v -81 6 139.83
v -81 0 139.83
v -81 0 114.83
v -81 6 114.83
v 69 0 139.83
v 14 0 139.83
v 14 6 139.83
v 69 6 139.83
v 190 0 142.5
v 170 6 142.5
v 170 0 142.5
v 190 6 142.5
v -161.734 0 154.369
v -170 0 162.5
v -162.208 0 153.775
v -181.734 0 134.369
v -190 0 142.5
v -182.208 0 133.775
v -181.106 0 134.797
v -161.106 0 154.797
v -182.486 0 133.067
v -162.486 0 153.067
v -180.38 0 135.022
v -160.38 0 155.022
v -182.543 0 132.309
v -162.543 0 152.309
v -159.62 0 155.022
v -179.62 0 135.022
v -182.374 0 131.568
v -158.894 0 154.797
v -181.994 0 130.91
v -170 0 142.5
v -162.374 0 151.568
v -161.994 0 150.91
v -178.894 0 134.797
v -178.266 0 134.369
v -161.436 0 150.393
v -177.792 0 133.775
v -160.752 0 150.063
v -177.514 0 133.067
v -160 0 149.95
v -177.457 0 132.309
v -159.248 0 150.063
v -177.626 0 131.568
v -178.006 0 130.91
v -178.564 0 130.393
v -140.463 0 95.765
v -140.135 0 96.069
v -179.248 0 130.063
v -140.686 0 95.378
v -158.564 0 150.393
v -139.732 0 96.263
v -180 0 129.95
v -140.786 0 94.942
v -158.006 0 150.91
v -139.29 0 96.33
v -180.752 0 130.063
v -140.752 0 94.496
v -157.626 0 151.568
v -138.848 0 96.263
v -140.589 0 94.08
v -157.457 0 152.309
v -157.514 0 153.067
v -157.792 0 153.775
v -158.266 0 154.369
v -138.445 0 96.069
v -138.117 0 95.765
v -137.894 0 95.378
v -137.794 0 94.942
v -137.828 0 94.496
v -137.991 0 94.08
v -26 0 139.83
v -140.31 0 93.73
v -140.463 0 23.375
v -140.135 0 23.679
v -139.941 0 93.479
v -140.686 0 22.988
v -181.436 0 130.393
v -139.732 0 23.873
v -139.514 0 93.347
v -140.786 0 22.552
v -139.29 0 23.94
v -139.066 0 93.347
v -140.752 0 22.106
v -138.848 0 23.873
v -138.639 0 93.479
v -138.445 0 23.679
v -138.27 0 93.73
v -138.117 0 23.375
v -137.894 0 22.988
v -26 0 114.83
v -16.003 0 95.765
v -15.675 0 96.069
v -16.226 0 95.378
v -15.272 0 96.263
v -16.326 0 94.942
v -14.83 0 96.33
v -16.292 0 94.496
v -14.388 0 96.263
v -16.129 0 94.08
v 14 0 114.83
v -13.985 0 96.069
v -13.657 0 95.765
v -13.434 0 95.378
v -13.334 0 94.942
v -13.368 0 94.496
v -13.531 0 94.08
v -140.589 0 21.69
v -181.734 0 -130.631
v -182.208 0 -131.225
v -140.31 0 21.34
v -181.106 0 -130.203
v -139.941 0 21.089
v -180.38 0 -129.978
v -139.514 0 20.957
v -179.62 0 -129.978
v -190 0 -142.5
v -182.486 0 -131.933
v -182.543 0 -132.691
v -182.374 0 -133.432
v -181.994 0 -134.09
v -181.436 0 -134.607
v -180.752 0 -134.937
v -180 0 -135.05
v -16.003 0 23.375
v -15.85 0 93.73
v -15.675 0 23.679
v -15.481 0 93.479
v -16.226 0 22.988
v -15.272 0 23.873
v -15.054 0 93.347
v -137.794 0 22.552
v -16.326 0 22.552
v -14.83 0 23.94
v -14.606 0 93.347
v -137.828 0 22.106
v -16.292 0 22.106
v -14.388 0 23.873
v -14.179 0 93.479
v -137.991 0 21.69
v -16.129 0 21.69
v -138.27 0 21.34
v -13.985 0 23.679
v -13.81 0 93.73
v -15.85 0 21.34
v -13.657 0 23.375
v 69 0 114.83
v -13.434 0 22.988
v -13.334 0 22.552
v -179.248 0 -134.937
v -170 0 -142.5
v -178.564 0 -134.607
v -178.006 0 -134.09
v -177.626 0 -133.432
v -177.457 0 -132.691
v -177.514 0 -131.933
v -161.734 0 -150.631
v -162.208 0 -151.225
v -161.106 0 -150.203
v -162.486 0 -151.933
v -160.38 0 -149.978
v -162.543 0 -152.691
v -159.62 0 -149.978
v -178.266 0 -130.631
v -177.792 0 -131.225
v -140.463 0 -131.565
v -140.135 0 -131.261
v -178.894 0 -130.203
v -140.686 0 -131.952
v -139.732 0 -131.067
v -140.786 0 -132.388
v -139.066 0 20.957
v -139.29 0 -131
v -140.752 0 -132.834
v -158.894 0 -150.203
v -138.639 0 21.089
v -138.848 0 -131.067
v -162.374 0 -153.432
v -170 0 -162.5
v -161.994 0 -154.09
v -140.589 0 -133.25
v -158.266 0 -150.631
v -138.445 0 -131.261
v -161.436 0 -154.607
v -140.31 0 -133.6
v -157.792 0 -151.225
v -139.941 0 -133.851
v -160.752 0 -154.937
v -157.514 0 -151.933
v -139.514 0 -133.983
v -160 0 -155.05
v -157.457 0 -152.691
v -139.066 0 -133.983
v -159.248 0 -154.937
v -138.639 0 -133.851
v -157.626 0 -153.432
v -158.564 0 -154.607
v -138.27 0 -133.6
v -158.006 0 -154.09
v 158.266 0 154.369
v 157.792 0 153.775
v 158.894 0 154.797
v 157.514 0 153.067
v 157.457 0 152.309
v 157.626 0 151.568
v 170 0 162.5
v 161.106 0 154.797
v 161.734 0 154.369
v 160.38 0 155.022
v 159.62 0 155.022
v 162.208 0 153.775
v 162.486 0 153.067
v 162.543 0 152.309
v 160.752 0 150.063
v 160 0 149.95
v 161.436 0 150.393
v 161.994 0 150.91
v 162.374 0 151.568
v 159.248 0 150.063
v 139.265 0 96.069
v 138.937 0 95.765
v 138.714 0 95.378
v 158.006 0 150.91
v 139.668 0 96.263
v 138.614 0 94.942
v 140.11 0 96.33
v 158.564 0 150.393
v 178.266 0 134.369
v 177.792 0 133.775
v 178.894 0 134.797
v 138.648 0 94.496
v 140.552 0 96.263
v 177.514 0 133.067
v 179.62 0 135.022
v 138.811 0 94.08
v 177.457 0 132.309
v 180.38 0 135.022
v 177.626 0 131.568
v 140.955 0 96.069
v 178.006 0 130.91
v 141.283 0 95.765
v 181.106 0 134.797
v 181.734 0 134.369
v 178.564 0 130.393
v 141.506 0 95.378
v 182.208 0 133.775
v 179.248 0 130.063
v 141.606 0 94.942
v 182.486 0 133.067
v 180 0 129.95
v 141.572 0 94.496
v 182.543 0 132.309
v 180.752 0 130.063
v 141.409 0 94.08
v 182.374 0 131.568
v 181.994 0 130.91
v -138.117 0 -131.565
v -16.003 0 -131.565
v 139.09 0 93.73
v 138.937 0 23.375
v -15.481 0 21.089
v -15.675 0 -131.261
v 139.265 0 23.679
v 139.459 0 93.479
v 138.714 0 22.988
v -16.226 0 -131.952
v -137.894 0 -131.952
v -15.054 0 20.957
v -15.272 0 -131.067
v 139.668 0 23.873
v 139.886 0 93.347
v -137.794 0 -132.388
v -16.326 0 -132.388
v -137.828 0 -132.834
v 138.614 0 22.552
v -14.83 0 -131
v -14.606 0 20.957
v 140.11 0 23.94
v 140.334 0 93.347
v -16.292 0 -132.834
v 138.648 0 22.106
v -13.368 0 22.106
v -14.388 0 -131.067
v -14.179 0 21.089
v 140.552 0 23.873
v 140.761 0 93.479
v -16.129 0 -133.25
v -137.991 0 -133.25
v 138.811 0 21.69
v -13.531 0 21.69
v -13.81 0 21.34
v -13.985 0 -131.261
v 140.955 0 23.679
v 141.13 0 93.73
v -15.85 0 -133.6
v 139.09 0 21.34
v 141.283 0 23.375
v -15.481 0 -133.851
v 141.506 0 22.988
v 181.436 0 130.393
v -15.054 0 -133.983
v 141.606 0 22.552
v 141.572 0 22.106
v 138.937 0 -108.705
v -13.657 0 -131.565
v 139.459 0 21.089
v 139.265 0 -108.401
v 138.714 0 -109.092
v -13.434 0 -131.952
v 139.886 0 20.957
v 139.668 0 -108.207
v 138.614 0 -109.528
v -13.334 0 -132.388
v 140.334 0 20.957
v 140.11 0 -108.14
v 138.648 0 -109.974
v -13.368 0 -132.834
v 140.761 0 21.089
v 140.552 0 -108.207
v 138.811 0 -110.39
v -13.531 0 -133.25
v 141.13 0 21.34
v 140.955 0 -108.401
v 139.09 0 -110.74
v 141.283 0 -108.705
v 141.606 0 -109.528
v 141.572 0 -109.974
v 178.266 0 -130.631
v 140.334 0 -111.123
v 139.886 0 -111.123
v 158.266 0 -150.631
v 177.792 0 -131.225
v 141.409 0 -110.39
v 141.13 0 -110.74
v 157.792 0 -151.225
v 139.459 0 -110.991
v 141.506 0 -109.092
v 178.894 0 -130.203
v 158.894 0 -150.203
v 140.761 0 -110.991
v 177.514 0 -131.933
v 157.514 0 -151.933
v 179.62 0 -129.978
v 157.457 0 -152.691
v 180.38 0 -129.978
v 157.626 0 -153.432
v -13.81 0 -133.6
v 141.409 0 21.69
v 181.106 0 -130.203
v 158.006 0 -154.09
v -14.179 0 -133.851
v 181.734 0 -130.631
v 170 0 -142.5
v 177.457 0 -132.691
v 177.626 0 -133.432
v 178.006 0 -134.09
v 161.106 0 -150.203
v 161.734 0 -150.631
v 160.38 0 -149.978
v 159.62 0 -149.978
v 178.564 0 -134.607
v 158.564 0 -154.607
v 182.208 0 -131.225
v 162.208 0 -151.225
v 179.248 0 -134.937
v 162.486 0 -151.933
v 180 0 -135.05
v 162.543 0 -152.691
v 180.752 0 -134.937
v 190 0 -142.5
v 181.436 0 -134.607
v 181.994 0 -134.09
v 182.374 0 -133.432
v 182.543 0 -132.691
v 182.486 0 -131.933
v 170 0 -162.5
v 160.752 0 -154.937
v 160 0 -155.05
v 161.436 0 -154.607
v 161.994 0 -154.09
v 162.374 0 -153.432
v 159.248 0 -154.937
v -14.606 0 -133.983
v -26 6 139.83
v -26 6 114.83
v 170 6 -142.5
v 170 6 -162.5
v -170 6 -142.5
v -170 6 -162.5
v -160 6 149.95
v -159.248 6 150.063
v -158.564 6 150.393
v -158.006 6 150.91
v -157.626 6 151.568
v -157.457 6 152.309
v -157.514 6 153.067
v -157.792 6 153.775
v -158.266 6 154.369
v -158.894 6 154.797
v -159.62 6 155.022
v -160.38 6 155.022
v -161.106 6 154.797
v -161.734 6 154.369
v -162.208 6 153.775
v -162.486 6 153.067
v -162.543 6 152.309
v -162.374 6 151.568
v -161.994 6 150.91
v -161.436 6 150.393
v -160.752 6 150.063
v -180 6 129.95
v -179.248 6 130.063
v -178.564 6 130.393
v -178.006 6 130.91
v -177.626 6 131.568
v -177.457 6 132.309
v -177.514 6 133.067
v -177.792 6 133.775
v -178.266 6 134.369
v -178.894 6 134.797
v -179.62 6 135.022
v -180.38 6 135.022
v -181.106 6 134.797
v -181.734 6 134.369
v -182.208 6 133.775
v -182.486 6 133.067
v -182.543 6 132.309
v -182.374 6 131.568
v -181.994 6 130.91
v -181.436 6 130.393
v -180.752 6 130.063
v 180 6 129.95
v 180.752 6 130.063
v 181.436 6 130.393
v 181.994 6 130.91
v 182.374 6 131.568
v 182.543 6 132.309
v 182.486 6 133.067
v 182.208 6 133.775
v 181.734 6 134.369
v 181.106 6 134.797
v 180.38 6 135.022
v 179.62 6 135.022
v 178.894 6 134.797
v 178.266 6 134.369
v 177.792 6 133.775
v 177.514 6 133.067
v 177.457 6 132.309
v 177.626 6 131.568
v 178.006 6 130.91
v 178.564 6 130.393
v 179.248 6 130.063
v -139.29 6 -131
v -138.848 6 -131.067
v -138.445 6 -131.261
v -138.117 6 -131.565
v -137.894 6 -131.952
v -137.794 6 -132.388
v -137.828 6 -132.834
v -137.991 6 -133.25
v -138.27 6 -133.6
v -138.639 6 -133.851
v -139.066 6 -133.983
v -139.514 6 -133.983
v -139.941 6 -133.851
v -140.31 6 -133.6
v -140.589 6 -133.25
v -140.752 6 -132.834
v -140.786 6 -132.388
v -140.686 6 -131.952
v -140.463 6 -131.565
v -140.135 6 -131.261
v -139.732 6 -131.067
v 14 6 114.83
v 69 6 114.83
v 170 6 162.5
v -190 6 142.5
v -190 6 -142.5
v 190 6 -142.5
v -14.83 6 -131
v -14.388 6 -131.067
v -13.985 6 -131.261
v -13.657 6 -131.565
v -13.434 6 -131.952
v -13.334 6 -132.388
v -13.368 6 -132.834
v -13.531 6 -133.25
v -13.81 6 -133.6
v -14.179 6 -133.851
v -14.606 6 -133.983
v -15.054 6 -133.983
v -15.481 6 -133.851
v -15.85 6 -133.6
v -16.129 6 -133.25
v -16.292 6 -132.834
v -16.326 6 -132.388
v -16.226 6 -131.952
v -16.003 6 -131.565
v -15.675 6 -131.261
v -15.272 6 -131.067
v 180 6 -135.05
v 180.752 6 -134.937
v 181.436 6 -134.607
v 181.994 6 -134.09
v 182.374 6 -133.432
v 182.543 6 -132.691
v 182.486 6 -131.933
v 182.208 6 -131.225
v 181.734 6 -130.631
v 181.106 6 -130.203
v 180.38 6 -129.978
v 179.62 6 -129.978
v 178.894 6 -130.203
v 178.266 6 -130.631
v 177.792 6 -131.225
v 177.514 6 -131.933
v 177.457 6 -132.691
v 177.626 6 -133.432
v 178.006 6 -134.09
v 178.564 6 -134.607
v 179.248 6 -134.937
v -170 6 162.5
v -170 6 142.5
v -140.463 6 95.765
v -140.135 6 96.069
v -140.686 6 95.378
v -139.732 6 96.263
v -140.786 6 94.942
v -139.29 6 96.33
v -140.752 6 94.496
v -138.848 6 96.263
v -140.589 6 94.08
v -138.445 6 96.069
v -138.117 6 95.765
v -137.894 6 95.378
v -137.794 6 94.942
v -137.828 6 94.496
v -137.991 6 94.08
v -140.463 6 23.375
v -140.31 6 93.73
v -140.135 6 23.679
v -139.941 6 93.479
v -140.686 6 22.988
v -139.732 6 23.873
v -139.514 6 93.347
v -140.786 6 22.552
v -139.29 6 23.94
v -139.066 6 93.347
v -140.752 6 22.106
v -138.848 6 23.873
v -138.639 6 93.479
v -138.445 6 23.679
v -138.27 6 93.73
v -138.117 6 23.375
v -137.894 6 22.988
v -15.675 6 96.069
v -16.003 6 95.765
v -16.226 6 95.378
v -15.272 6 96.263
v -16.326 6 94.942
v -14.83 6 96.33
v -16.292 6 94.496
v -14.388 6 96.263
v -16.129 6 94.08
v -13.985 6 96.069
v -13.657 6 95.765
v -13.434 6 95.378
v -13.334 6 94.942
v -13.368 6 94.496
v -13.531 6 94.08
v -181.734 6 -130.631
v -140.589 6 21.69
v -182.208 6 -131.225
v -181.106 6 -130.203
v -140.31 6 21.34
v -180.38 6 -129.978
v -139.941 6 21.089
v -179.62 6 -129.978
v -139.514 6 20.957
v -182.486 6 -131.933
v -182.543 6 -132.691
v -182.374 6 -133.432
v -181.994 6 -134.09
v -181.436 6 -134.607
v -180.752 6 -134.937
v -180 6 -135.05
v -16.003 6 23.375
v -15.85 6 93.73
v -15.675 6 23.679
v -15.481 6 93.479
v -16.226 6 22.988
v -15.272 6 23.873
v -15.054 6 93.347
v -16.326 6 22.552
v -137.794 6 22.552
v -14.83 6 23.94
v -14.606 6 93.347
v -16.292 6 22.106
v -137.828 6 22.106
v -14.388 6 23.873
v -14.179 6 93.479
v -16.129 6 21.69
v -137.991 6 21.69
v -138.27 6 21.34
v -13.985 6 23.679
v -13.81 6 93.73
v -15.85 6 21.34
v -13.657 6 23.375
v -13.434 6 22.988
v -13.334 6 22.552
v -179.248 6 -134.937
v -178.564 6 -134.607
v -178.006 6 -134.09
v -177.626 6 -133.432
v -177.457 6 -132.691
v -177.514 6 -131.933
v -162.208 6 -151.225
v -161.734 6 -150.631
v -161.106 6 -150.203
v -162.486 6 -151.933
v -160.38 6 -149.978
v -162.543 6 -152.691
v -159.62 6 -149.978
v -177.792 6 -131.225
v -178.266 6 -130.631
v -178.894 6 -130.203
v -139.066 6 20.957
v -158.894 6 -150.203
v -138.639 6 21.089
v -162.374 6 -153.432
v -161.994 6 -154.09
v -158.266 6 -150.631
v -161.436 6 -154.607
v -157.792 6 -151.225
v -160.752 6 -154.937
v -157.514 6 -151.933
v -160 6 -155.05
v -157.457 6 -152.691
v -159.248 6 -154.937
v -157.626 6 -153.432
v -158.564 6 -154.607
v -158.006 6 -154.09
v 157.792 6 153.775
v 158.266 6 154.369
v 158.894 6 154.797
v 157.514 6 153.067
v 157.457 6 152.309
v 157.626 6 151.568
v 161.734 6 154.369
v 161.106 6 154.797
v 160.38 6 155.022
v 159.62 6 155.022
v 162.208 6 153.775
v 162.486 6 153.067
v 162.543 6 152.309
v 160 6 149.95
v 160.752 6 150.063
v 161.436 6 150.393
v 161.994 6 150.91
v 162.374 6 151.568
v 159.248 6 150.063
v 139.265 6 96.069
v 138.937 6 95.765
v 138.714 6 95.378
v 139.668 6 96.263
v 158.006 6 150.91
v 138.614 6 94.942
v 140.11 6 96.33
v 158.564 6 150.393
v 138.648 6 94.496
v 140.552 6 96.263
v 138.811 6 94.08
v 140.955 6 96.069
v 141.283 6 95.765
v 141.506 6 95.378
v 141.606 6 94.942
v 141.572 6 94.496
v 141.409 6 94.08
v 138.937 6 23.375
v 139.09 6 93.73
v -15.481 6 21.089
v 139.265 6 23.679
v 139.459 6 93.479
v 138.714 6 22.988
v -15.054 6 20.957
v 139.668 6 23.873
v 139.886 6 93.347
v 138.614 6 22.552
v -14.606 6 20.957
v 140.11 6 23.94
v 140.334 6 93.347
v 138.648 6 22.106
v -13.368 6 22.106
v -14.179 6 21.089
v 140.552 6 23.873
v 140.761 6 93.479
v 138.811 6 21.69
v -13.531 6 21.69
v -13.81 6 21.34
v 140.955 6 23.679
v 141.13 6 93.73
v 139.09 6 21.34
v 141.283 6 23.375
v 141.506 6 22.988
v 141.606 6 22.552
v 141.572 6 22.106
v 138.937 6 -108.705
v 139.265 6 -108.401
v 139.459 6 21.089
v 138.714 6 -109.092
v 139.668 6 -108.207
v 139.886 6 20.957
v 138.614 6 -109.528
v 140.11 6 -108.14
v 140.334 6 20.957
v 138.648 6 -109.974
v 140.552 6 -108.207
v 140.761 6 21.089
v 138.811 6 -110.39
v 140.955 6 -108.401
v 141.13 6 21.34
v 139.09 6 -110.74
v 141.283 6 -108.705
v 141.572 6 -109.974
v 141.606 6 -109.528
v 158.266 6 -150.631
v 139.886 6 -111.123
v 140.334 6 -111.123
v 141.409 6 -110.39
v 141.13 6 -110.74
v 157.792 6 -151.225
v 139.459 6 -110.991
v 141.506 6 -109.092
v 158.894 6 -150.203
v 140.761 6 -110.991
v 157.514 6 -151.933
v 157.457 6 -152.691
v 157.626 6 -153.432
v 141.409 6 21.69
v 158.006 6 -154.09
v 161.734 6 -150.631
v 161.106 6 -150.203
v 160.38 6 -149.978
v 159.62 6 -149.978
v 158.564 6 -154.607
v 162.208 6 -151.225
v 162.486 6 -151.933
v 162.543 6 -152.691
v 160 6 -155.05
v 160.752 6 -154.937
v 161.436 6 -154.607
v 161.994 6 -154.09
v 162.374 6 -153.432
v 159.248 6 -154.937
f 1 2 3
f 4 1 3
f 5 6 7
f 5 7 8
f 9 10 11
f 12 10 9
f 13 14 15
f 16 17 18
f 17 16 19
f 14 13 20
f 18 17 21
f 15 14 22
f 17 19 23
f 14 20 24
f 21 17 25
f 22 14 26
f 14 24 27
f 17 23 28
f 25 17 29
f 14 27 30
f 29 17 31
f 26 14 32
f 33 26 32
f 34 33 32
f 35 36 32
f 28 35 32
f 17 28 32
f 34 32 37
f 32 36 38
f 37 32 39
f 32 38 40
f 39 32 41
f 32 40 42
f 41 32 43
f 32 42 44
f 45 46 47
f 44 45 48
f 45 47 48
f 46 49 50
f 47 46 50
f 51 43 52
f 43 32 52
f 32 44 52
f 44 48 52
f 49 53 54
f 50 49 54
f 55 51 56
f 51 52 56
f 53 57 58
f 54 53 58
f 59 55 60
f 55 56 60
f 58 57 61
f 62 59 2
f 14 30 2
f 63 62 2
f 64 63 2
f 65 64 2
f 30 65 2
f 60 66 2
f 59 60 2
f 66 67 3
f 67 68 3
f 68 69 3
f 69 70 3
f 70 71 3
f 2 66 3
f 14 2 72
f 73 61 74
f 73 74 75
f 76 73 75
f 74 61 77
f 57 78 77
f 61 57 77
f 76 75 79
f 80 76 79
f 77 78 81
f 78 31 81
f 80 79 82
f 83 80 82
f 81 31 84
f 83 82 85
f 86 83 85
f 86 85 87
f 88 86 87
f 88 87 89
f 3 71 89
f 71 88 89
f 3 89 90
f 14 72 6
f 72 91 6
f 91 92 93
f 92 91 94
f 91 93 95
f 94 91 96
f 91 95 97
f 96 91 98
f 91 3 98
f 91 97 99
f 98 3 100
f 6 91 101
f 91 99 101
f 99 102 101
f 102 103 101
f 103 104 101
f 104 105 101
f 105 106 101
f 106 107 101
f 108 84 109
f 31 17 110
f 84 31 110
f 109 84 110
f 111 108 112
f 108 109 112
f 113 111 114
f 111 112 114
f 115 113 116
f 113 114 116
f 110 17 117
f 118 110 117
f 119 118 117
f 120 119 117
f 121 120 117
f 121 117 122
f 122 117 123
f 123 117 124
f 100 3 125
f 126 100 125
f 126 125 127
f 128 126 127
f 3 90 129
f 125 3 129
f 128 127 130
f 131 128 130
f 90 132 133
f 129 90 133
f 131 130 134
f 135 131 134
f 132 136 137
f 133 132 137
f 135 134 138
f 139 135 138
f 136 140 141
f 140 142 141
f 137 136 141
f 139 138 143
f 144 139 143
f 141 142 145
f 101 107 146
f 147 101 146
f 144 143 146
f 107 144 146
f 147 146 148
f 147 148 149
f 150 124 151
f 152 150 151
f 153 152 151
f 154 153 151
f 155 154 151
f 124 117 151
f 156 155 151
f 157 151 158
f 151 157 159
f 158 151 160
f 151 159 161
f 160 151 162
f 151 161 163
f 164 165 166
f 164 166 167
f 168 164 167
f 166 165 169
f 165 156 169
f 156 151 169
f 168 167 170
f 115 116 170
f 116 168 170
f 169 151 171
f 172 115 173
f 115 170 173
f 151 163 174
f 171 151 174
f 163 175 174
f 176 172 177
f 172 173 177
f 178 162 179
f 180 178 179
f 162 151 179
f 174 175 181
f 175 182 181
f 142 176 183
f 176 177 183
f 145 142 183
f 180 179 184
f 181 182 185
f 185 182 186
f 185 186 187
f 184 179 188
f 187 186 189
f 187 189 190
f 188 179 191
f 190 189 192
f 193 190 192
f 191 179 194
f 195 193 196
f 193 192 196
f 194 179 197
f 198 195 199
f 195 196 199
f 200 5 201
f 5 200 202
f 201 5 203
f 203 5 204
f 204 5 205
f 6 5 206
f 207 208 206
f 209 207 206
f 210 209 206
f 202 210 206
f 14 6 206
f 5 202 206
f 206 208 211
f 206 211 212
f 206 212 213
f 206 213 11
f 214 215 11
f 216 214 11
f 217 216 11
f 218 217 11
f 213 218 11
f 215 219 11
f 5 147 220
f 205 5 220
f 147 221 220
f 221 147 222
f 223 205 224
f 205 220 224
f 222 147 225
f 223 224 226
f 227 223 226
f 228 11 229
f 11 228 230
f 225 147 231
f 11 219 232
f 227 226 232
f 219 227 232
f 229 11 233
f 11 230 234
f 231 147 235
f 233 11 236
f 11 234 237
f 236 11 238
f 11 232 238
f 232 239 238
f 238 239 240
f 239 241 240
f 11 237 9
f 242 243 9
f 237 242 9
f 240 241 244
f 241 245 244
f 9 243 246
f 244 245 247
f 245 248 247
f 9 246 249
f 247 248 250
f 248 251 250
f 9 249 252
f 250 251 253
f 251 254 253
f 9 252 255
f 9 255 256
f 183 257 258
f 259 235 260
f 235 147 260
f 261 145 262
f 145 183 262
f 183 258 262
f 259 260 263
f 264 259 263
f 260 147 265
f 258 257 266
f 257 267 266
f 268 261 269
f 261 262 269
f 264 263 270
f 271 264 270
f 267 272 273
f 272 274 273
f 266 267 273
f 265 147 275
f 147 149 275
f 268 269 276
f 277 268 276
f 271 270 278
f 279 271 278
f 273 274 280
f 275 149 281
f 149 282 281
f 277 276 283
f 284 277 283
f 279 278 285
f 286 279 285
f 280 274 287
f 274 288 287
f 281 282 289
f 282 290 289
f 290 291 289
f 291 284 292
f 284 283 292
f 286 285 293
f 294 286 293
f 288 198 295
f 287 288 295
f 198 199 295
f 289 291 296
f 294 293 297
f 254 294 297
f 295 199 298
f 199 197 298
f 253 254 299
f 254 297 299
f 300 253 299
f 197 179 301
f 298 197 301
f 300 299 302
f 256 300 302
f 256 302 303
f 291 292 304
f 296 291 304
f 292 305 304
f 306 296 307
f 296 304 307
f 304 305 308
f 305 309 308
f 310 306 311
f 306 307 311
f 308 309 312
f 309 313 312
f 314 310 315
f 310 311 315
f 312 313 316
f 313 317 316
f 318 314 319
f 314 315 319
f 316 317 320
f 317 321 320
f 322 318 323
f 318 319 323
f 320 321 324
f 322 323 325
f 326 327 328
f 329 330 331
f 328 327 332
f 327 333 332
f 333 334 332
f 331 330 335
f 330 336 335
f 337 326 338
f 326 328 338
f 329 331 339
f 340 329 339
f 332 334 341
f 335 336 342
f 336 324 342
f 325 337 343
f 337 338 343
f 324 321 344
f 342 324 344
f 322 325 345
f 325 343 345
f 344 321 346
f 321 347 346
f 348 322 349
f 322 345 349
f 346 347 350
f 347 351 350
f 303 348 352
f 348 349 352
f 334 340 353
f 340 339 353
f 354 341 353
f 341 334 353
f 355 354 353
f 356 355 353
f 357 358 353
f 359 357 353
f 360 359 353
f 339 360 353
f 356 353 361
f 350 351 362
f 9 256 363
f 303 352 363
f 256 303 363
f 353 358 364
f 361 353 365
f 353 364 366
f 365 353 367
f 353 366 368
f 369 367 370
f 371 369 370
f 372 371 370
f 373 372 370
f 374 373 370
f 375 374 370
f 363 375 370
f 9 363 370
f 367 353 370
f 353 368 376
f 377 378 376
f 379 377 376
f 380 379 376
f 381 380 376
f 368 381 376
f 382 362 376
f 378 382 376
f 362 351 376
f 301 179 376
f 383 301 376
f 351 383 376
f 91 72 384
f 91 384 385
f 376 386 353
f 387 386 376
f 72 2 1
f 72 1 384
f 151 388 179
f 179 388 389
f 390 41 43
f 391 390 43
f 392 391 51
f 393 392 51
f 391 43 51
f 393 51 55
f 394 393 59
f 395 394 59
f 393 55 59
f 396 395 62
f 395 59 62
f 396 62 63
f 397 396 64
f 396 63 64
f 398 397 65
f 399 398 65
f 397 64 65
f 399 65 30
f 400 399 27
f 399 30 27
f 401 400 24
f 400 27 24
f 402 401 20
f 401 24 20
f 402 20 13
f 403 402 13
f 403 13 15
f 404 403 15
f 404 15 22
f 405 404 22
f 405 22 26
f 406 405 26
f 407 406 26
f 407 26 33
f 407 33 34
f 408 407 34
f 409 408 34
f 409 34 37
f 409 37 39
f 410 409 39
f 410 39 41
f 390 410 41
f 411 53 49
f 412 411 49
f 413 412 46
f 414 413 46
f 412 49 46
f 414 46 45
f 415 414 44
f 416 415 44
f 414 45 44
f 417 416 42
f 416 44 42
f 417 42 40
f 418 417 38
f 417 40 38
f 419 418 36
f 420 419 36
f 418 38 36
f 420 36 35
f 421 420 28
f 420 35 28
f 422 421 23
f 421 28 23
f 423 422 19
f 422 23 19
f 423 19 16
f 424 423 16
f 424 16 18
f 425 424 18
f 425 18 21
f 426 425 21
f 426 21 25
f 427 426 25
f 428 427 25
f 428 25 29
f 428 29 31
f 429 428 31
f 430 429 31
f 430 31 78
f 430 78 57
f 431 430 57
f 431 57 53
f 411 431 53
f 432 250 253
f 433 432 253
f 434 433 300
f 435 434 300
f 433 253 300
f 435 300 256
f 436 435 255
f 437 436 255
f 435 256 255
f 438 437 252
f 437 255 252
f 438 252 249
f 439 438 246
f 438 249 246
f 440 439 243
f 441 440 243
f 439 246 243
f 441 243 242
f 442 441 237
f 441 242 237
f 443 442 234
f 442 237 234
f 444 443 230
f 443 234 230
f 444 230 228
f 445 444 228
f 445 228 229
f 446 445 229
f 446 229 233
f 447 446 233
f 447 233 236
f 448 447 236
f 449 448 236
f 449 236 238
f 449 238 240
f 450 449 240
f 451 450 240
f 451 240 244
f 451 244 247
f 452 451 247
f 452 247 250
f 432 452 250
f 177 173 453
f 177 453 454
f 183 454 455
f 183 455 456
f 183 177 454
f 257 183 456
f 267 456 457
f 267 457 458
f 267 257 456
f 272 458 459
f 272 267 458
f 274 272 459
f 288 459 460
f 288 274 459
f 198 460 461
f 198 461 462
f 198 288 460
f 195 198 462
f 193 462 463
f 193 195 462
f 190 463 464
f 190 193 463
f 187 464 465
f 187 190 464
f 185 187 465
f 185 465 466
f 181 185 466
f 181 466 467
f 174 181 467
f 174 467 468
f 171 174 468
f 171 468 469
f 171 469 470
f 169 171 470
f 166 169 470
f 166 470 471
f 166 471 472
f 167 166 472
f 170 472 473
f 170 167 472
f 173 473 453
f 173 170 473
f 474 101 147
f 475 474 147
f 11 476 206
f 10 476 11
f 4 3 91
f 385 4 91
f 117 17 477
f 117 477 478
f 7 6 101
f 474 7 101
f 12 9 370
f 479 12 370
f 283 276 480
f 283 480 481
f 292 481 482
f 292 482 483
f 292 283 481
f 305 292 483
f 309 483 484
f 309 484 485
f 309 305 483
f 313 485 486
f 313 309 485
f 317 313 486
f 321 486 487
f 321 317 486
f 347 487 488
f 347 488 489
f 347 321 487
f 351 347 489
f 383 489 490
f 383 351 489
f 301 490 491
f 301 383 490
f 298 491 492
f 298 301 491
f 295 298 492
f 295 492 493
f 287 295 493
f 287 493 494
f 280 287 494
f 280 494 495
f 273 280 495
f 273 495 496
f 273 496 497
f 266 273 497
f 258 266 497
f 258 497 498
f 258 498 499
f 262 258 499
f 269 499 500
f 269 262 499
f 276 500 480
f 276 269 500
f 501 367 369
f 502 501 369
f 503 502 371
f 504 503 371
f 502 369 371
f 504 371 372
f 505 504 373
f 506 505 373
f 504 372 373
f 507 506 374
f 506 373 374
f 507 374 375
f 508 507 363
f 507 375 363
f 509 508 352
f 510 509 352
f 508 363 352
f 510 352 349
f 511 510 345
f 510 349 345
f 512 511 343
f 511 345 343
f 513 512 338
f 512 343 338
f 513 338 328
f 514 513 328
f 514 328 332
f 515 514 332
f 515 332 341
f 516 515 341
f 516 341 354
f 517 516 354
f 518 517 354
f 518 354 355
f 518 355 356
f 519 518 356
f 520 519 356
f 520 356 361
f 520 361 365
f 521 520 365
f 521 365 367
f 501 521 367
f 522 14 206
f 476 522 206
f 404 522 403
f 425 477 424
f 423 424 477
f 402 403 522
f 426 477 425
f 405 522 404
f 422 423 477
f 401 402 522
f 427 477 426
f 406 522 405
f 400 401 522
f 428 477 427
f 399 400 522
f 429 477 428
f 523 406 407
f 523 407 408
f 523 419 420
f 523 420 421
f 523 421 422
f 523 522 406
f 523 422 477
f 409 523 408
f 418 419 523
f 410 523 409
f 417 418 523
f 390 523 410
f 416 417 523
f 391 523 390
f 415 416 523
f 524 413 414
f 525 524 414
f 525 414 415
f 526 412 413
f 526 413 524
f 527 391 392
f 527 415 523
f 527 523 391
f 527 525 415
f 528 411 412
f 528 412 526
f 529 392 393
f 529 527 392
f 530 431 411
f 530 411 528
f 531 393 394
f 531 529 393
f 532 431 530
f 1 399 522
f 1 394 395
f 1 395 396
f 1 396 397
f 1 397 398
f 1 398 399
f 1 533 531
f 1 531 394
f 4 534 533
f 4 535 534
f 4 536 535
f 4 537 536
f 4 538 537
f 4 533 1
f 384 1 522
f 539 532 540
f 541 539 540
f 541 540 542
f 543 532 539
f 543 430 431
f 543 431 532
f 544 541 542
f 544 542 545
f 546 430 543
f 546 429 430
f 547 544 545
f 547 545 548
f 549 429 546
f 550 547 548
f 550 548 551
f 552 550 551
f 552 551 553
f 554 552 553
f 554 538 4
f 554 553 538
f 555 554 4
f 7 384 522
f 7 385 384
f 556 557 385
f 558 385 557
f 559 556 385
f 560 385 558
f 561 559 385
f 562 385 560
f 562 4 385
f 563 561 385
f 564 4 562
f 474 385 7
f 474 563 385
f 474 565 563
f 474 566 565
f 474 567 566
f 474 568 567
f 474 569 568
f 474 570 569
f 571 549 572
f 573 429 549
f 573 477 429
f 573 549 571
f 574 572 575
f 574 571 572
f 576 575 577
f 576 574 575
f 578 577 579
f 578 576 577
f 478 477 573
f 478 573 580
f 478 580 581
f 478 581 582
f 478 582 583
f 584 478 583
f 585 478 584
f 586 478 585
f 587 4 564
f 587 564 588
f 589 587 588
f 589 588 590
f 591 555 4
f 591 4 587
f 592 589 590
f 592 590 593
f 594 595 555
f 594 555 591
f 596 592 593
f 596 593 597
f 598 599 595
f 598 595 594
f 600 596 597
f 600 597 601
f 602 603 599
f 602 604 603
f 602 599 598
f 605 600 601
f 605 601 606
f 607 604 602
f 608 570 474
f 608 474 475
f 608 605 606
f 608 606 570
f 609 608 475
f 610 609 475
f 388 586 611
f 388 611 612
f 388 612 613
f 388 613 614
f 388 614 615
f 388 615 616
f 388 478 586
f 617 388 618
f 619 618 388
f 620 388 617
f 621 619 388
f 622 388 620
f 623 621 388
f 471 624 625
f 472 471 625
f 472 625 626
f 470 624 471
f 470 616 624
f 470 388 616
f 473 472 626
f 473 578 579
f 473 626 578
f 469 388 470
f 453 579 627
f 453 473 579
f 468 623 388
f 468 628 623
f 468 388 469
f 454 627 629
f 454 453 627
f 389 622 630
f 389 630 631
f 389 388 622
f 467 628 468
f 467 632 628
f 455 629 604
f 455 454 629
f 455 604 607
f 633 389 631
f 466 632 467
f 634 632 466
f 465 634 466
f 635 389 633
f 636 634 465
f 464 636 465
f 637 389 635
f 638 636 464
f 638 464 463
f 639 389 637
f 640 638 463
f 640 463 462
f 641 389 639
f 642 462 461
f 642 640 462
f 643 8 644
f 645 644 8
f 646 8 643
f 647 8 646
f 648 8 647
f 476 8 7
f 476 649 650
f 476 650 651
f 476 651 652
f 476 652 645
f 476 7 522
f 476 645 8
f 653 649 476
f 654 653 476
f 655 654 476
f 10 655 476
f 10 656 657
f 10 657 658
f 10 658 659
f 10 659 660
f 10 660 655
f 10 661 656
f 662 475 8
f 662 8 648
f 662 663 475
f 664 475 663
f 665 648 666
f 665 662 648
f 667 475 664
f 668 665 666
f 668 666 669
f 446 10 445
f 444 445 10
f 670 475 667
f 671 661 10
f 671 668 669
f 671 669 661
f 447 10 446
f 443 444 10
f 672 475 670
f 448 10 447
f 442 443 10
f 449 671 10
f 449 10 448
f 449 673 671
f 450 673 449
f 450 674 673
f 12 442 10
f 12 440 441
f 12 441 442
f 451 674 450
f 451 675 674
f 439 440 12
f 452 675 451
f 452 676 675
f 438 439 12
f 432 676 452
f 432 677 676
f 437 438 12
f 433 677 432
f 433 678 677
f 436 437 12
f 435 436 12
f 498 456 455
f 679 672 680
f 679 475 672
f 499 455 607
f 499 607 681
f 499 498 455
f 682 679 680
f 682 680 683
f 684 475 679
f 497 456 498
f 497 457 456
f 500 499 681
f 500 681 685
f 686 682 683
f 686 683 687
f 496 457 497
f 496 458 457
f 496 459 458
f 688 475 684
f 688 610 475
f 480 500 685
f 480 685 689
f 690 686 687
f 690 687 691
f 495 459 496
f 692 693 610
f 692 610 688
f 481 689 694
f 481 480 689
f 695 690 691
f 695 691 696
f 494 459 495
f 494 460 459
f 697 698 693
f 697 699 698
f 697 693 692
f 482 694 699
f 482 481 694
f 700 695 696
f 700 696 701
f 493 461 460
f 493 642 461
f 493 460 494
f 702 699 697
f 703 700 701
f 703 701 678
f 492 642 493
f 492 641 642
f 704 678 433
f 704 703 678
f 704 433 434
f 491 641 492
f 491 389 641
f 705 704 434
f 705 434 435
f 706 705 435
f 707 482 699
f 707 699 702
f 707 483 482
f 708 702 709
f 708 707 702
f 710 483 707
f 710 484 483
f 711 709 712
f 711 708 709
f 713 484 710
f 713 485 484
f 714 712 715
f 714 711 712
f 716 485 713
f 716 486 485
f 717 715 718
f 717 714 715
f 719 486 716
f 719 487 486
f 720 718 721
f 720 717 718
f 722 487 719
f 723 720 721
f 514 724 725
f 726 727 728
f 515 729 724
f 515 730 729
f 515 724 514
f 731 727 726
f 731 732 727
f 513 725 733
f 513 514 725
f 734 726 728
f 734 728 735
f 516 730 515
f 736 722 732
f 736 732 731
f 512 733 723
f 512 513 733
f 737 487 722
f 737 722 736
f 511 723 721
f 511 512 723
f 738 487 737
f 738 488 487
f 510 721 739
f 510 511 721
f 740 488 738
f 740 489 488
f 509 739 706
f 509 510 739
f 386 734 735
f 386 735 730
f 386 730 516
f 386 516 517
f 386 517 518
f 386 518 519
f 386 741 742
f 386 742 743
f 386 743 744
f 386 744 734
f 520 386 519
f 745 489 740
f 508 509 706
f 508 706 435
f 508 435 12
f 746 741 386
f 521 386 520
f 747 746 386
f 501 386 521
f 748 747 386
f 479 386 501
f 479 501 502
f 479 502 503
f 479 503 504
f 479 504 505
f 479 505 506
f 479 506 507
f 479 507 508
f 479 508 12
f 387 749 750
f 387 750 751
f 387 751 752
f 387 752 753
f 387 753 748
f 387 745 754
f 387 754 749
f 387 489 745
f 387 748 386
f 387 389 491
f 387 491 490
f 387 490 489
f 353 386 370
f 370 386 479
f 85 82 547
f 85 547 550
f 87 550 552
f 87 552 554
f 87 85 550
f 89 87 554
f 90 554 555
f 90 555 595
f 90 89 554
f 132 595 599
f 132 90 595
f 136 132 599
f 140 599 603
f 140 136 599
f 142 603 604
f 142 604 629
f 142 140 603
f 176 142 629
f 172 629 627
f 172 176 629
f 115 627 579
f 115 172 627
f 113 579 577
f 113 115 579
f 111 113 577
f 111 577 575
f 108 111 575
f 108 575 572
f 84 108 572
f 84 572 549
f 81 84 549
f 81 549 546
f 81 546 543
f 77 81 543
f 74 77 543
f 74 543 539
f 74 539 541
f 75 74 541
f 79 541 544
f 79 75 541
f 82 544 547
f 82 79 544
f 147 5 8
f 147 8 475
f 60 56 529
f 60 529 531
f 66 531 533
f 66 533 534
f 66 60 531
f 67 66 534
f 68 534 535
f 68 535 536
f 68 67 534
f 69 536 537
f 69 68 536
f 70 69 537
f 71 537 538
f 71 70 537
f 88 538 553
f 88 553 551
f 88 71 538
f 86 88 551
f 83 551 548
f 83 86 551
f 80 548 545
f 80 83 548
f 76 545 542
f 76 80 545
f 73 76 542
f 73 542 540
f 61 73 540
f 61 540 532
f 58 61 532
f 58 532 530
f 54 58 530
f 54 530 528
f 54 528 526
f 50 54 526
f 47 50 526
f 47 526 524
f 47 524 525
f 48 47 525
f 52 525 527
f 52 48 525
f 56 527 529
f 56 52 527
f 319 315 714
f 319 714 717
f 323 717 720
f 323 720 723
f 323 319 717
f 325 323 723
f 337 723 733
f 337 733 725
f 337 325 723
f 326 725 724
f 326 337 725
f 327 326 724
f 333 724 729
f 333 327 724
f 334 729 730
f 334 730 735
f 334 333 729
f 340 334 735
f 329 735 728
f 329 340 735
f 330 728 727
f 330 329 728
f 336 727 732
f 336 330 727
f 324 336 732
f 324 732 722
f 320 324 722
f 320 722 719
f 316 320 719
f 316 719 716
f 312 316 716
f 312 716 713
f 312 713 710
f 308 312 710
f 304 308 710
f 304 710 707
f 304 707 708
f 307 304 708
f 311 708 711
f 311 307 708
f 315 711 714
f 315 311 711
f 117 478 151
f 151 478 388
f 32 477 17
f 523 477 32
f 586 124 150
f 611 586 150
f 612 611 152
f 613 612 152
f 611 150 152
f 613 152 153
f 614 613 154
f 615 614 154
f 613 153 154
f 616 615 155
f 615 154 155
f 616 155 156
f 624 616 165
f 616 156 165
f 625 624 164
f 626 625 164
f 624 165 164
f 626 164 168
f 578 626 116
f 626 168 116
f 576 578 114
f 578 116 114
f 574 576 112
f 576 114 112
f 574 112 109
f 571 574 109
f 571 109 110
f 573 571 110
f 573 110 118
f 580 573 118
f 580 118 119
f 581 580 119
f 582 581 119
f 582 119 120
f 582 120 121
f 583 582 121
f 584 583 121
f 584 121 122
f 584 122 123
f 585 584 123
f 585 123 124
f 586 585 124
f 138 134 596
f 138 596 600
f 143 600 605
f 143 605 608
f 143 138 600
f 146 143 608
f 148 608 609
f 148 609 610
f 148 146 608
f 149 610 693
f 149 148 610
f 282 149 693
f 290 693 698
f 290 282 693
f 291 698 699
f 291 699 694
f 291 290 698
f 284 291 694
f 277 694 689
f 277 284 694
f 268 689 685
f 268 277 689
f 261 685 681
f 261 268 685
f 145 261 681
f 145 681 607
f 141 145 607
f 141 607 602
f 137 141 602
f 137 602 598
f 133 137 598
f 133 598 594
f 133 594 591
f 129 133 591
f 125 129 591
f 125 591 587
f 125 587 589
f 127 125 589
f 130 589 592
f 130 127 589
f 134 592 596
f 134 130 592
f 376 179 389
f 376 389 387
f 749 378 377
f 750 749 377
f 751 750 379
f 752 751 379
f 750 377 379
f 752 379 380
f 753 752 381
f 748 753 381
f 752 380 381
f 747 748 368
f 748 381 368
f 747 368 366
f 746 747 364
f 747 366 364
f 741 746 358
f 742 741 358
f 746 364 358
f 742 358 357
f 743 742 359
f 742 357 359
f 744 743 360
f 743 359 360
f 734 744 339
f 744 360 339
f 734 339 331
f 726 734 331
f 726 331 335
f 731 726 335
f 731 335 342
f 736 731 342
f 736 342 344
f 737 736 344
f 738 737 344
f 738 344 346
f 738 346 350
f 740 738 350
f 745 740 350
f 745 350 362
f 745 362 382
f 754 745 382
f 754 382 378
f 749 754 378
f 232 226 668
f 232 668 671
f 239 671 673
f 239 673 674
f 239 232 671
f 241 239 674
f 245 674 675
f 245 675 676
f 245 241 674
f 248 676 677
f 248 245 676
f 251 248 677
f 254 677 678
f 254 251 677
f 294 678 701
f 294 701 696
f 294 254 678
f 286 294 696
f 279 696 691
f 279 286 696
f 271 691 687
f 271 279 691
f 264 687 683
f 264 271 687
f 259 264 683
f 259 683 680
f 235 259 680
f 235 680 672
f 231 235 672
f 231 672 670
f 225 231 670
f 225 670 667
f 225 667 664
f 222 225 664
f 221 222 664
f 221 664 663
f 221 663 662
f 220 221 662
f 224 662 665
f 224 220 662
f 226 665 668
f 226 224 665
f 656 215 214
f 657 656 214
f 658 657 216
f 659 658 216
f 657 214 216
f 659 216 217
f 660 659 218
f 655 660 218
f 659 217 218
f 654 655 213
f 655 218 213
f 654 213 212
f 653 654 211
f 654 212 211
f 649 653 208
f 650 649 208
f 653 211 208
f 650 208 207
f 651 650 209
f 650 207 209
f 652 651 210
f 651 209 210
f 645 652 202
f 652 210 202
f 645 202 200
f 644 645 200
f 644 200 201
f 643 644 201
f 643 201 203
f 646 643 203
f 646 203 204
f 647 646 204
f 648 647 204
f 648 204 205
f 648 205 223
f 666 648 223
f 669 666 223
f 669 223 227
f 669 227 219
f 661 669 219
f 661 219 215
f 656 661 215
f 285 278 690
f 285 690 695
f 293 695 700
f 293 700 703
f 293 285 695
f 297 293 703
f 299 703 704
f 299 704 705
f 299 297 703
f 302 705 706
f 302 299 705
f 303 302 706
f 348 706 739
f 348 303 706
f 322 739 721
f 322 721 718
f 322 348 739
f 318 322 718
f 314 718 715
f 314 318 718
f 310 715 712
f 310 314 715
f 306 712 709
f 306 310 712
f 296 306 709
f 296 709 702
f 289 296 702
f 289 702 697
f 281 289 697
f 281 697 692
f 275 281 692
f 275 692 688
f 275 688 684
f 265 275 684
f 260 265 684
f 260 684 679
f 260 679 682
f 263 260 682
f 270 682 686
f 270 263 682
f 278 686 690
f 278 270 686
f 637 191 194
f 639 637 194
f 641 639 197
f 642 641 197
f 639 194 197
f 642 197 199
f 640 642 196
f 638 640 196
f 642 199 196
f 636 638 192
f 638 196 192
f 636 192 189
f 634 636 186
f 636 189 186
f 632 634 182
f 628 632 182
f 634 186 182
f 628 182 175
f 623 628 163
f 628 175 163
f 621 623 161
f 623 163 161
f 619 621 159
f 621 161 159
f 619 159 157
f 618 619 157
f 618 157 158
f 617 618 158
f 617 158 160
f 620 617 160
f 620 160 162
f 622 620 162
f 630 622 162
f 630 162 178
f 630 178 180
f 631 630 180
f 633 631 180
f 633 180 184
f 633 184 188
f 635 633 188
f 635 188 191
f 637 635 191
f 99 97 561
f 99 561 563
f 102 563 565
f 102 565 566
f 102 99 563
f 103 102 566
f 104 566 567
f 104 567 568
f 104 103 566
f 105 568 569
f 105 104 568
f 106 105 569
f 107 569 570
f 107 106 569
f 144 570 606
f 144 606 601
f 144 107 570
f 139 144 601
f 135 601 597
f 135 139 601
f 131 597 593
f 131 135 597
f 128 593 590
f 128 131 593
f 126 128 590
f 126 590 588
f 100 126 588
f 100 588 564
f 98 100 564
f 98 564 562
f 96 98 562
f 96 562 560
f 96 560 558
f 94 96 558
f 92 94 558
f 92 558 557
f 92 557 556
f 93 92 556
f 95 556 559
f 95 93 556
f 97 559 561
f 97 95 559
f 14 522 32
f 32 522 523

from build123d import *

# Parameters (mm, degrees)
BASE_PLATE_W        = 380
BASE_PLATE_H        = 325
BASE_PLATE_R        = 1.5
BASE_PLATE_R_2      = 2.5
BASE_PLATE_W_2      = 55
BASE_PLATE_H_2      = 25
BOSS_EXTRUDE1_DEPTH = 6
SKETCH1_W           = 20
SKETCH1_H           = 20
CUT_EXTRUDE1_DEPTH  = 10
SKETCH2_R           = 2.55
CUT_EXTRUDE2_DEPTH  = 10


with BuildPart() as part:
    # Base Plate → Boss-Extrude1 (new body)
    with BuildSketch(Plane(origin=(0, 0, 0), x_dir=(1, 0, 0), z_dir=(0, 1, 0))):
        Rectangle(BASE_PLATE_W, BASE_PLATE_H)
        with Locations(Location((-139.29, -94.83, 0), (0, 0, 270))):
            Circle(BASE_PLATE_R, mode=Mode.SUBTRACT)
        with Locations(Location((-14.83, -22.44, 0), (0, 0, 270))):
            Circle(BASE_PLATE_R, mode=Mode.SUBTRACT)
        with Locations(Location((-139.29, -22.44, 0), (0, 0, 270))):
            Circle(BASE_PLATE_R, mode=Mode.SUBTRACT)
        with Locations(Location((-139.29, 132.5, 0), (0, 0, 270))):
            Circle(BASE_PLATE_R, mode=Mode.SUBTRACT)
        with Locations(Location((-14.83, 132.5, 0), (0, 0, 270))):
            Circle(BASE_PLATE_R, mode=Mode.SUBTRACT)
        with Locations(Location((-14.83, -94.83, 0), (0, 0, 270))):
            Circle(BASE_PLATE_R, mode=Mode.SUBTRACT)
        with Locations(Location((140.11, -94.83, 0), (0, 0, 270))):
            Circle(BASE_PLATE_R, mode=Mode.SUBTRACT)
        with Locations(Location((140.11, -22.44, 0), (0, 0, 270))):
            Circle(BASE_PLATE_R, mode=Mode.SUBTRACT)
        with Locations(Location((140.11, 109.64, 0), (0, 0, 270))):
            Circle(BASE_PLATE_R, mode=Mode.SUBTRACT)
        with Locations(Location((-180, -152.5, 0), (0, 0, 270))):
            Circle(BASE_PLATE_R_2, mode=Mode.SUBTRACT)
        with Locations(Location((180, -152.5, 0), (0, 0, 270))):
            Circle(BASE_PLATE_R_2, mode=Mode.SUBTRACT)
        with Locations(Location((-180, 152.5, 0), (0, 0, 270))):
            Circle(BASE_PLATE_R_2, mode=Mode.SUBTRACT)
        with Locations(Location((180, 152.5, 0), (0, 0, 270))):
            Circle(BASE_PLATE_R_2, mode=Mode.SUBTRACT)
        with Locations((41.5, -127.33)):
            Rectangle(BASE_PLATE_W_2, BASE_PLATE_H_2, mode=Mode.SUBTRACT)
        with Locations((-53.5, -127.33)):
            Rectangle(BASE_PLATE_W_2, BASE_PLATE_H_2, mode=Mode.SUBTRACT)
    extrude(amount=BOSS_EXTRUDE1_DEPTH)

    # Sketch1 → Cut-Extrude1 (cut)
    with BuildSketch(Plane(origin=(0, 6, 0), x_dir=(1, 0, 0), z_dir=(0, 1, 0))):
        with Locations((-180, 152.5)):
            Rectangle(SKETCH1_W, SKETCH1_H)
        with Locations((180, 152.5)):
            Rectangle(SKETCH1_W, SKETCH1_H)
        with Locations((180, -152.5)):
            Rectangle(SKETCH1_W, SKETCH1_H)
        with Locations((-180, -152.5)):
            Rectangle(SKETCH1_W, SKETCH1_H)
    extrude(amount=-CUT_EXTRUDE1_DEPTH, mode=Mode.SUBTRACT)

    # Sketch2 → Cut-Extrude2 (cut)
    with BuildSketch(Plane.XZ):
        with Locations(Location((-160, 152.5, 0), (0, 0, 270))):
            Circle(SKETCH2_R)
        with Locations(Location((-180, 132.5, 0), (0, 0, 270))):
            Circle(SKETCH2_R)
        with Locations(Location((-180, -132.5, 0), (0, 0, 270))):
            Circle(SKETCH2_R)
        with Locations(Location((-160, -152.5, 0), (0, 0, 270))):
            Circle(SKETCH2_R)
        with Locations(Location((160, -152.5, 0), (0, 0, 270))):
            Circle(SKETCH2_R)
        with Locations(Location((180, -132.5, 0), (0, 0, 270))):
            Circle(SKETCH2_R)
        with Locations(Location((180, 132.5, 0), (0, 0, 270))):
            Circle(SKETCH2_R)
        with Locations(Location((160, 152.5, 0), (0, 0, 270))):
            Circle(SKETCH2_R)
    extrude(amount=-CUT_EXTRUDE2_DEPTH, mode=Mode.SUBTRACT)


solid = part.part
